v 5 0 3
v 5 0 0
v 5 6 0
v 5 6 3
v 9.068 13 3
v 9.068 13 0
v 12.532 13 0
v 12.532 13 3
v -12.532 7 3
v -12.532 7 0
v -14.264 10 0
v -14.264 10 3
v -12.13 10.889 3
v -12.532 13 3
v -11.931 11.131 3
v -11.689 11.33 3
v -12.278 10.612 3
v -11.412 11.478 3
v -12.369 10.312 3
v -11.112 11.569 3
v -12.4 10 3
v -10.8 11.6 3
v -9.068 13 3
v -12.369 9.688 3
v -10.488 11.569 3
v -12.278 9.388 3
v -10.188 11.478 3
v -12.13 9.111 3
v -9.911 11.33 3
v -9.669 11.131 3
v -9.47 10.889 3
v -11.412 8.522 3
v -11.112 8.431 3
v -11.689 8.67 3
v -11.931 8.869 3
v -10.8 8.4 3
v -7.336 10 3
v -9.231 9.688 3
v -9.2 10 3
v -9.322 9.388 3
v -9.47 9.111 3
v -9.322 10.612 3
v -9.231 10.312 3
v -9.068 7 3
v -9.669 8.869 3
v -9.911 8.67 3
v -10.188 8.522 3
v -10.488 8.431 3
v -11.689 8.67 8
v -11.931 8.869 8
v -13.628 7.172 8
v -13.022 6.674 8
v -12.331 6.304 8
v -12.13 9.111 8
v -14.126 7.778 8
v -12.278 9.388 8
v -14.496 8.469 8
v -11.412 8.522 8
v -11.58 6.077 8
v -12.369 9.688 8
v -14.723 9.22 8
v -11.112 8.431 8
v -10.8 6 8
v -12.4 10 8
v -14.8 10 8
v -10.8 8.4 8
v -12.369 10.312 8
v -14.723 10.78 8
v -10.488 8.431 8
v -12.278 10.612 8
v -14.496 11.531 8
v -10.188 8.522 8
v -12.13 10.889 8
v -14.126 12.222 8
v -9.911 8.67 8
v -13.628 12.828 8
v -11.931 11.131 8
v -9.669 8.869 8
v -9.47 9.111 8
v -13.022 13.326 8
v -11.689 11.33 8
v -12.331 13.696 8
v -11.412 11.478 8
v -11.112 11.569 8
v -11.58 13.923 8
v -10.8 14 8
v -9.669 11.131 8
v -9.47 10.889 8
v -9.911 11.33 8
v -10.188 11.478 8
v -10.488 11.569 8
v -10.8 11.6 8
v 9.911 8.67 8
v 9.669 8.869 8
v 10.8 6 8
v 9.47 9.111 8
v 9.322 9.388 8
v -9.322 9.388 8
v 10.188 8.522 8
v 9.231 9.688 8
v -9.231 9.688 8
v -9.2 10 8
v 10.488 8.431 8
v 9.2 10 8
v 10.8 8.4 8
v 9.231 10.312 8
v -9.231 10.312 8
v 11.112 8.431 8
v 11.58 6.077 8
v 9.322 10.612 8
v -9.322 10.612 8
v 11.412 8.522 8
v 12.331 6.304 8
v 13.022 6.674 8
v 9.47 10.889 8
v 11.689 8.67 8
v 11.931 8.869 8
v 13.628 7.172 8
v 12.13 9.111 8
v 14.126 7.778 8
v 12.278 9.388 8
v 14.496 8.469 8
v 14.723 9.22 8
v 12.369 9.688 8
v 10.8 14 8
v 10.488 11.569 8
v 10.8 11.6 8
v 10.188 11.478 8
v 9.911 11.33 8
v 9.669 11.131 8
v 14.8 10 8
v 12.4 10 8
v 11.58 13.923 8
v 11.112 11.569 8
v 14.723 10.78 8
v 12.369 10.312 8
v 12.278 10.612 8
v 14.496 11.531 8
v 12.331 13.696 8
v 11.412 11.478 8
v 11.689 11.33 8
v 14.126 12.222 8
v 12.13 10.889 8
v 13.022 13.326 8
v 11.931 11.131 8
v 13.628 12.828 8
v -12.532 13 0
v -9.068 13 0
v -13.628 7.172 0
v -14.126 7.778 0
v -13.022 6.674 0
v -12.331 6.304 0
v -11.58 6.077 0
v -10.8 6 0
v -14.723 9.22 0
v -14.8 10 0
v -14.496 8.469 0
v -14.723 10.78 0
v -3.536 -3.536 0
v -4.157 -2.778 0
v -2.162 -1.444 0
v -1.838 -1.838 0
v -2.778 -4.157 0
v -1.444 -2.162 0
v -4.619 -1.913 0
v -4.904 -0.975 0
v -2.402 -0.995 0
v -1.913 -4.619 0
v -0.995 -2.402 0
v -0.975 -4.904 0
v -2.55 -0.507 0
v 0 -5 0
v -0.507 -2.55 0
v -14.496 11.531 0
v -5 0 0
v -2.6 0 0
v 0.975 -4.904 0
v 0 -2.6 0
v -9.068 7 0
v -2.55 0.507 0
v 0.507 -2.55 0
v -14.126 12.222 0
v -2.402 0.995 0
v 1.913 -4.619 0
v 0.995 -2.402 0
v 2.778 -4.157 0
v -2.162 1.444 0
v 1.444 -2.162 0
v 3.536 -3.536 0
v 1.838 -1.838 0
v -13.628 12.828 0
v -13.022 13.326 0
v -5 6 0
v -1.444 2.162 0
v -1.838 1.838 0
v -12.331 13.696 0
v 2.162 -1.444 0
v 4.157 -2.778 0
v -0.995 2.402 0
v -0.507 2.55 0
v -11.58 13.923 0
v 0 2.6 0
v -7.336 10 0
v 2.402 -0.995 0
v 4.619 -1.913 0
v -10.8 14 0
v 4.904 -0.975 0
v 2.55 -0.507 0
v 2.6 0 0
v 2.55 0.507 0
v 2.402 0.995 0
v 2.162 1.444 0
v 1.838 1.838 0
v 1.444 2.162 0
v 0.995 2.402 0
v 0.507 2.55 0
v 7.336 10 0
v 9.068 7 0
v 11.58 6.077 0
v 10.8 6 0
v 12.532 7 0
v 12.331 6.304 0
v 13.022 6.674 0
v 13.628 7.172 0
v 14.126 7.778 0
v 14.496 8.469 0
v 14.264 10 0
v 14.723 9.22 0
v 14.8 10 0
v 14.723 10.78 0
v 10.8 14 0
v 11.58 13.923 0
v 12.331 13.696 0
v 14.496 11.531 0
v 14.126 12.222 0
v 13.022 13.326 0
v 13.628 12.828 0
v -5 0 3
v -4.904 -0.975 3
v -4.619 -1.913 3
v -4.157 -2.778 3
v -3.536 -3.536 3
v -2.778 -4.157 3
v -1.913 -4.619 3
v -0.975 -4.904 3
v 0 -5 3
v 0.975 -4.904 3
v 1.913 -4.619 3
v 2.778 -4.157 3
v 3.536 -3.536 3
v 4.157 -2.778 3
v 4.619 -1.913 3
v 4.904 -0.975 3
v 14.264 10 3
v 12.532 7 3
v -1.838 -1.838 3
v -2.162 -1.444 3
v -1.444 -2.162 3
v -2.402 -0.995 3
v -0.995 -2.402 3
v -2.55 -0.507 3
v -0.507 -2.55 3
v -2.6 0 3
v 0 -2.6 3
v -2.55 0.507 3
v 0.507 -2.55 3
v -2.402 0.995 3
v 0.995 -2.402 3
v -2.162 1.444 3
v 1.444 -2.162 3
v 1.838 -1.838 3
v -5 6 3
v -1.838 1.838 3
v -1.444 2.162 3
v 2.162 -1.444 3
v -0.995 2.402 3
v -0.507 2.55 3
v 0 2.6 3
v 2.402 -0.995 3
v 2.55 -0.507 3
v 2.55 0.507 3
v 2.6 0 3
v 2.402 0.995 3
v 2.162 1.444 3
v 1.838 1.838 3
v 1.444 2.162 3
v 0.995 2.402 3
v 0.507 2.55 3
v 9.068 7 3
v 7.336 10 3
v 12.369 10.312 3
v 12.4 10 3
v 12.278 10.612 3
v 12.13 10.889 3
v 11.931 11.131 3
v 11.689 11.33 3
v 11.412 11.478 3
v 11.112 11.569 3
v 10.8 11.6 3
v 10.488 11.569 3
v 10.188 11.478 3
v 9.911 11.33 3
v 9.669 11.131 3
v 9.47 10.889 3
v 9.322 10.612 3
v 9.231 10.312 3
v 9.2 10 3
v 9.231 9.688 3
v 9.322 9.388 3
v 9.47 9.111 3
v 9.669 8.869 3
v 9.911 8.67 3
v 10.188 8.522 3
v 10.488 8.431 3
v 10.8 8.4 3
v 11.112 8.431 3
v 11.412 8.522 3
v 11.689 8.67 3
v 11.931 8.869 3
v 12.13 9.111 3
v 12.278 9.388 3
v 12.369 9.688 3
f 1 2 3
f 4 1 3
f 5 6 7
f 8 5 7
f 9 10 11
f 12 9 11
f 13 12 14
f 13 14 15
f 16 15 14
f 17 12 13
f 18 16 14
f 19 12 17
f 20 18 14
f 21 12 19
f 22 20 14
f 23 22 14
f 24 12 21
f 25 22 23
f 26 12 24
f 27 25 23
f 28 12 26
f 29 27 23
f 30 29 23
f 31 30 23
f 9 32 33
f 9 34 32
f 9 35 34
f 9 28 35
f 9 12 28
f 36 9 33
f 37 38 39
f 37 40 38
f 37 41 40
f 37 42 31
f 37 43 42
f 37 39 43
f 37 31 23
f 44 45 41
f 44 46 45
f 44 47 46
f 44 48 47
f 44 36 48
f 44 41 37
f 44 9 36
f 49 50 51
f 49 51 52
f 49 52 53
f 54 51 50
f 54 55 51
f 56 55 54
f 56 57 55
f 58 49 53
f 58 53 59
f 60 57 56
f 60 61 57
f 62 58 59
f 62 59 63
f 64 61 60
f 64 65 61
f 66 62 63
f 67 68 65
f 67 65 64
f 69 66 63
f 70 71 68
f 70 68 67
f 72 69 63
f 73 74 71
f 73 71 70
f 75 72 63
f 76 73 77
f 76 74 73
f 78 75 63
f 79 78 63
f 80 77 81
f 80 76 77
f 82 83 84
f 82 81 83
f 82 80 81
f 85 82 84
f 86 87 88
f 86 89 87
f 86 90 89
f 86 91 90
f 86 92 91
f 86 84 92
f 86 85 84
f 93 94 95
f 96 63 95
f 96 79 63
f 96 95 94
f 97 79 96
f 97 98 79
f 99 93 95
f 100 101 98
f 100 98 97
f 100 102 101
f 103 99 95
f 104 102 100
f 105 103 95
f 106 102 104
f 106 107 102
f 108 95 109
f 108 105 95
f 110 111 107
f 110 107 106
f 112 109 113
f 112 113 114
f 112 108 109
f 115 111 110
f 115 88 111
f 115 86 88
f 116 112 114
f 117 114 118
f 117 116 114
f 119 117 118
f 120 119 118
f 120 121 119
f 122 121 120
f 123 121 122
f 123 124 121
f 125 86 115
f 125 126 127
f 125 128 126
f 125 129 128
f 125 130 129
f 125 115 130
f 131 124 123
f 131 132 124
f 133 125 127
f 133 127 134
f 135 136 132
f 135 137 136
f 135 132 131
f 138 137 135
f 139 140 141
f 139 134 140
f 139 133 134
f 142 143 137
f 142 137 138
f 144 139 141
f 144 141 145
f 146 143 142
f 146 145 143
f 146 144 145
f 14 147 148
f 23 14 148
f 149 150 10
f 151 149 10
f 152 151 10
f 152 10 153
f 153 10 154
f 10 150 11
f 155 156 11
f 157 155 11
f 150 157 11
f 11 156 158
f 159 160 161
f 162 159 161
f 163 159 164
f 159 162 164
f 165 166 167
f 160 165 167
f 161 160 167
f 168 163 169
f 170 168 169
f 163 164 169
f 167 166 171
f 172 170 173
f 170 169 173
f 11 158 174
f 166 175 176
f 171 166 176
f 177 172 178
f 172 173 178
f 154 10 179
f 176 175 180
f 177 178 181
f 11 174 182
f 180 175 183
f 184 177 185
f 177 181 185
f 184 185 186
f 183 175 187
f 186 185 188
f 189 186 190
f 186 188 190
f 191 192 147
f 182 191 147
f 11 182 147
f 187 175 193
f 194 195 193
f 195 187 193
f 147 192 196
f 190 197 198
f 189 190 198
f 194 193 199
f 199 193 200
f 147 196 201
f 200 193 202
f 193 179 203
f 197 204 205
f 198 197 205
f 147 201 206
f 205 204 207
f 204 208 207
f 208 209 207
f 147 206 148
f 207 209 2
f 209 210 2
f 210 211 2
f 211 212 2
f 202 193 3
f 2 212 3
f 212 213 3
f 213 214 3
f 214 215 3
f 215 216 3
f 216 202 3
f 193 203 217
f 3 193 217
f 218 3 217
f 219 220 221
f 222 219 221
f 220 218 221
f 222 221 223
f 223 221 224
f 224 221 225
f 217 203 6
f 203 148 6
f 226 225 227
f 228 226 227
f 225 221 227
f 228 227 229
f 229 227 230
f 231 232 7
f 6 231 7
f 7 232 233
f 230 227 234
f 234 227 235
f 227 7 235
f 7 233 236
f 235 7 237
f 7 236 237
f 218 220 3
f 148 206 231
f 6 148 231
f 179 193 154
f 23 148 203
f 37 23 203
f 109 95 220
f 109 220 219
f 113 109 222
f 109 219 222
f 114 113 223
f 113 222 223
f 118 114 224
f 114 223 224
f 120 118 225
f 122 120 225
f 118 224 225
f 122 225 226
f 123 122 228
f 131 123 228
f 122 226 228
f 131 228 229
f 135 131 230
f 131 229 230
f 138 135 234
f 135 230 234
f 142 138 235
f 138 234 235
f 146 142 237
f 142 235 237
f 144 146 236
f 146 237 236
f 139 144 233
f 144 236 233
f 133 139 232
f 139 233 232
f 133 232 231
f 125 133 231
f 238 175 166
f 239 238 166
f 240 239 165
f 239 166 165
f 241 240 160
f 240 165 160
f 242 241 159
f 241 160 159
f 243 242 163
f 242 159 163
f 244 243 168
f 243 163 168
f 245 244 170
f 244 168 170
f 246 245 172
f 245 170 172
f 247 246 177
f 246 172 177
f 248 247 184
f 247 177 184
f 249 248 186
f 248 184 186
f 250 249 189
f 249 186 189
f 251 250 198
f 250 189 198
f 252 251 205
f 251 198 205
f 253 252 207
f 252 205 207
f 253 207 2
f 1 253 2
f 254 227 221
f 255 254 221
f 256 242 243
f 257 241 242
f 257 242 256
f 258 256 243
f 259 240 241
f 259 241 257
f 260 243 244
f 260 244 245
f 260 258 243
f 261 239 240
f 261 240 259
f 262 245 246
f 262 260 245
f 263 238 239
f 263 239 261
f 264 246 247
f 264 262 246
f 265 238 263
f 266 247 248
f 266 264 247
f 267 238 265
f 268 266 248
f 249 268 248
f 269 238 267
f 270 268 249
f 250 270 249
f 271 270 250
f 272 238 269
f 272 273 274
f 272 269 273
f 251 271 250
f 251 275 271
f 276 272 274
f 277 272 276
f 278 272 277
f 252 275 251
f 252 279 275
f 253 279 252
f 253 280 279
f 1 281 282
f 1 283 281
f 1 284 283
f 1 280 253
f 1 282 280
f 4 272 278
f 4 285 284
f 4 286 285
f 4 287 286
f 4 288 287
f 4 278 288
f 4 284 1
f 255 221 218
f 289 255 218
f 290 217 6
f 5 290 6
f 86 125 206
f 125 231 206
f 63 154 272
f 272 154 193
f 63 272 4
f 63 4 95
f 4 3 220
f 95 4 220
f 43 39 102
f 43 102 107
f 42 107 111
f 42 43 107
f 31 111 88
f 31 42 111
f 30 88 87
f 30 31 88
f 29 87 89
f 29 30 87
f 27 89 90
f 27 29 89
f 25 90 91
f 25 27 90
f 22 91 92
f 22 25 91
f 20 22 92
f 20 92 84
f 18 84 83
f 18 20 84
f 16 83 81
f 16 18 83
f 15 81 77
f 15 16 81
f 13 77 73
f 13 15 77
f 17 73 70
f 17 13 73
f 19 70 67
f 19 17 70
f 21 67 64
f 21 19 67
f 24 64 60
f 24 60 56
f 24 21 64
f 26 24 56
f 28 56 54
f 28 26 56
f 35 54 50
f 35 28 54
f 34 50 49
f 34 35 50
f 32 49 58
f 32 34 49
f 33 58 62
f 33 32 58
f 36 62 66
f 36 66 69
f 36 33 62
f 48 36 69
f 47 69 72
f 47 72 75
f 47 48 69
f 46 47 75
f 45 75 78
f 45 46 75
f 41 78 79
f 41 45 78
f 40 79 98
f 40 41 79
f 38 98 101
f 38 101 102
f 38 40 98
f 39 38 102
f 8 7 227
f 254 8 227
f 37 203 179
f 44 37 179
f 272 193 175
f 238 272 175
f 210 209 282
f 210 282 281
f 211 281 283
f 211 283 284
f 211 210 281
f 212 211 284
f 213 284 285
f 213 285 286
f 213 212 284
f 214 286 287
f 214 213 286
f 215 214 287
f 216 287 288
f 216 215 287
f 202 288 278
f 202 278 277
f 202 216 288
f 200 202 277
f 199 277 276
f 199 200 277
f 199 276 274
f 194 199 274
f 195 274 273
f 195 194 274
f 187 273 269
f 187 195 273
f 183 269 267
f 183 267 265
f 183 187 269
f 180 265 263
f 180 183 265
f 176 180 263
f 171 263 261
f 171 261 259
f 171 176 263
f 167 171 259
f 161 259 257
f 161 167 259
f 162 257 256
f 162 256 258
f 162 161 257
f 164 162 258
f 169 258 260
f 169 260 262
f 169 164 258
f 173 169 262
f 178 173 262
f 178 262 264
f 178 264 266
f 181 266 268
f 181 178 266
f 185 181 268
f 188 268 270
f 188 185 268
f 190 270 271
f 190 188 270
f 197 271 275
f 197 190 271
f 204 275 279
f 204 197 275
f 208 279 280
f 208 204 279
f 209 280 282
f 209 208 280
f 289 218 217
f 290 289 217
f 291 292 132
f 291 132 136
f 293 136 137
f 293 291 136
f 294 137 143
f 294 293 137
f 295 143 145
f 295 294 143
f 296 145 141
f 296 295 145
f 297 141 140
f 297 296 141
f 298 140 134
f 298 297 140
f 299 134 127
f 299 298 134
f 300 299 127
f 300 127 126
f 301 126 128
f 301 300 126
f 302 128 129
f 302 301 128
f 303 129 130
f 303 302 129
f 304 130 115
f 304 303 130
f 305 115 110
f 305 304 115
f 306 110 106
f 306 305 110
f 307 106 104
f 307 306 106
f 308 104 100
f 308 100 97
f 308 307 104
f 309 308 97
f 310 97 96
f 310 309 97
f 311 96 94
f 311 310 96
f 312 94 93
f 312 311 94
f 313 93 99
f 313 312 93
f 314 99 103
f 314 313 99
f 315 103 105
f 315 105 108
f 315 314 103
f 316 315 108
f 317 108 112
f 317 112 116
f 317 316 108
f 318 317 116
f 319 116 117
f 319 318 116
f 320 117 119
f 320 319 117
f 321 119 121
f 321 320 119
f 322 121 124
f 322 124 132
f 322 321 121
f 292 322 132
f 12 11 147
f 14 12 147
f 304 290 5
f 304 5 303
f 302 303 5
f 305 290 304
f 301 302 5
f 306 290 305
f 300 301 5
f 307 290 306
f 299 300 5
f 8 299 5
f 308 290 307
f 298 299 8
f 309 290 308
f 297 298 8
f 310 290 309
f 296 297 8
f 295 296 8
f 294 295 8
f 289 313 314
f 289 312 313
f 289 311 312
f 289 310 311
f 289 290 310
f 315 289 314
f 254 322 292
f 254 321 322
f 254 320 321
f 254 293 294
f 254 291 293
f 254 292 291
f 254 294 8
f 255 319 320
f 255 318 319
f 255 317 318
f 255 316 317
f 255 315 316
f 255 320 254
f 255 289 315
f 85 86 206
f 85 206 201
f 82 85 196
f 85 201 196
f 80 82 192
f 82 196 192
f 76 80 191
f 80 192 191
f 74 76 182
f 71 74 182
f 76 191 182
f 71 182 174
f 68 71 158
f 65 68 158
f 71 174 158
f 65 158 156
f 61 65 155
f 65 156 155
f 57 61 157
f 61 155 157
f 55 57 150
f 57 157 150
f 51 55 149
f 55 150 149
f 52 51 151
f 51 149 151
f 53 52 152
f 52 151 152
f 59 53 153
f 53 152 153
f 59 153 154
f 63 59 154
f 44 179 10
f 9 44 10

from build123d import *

# Parameters (mm, degrees)
F0_R     = 2.6
F0_R_2   = 1.6
F1_DEPTH = 3
F2_R     = 1.6
F3_DEPTH = 5
F5_DEPTH = 3


with BuildPart() as f1:
    # F0 (on Top) → F1 (new body)
    with BuildSketch(Plane.XY):
        with BuildLine():
            Line((-5, 6), (-5, 0))
            ThreePointArc((-5, 0), (0, -5), (5, 0))
            Line((5, 0), (5, 6))
            Line((5, 6), (10.8, 6))
            ThreePointArc((10.8, 6), (14.8, 10), (10.8, 14))
            Line((10.8, 14), (0, 14))
            Line((0, 14), (-10.8, 14))
            ThreePointArc((-10.8, 14), (-14.8, 10), (-10.8, 6))
            Line((-10.8, 6), (-5, 6))
        make_face()
        Circle(F0_R, mode=Mode.SUBTRACT)
        with Locations((-10.8, 10)):
            Circle(F0_R_2, mode=Mode.SUBTRACT)
        with Locations((10.8, 10)):
            Circle(F0_R_2, mode=Mode.SUBTRACT)
    extrude(amount=F1_DEPTH)

    # F2 (on face) → F3 (join)
    with BuildSketch(Plane.XY.offset(3)):
        with BuildLine():
            ThreePointArc((10.8, 6), (14.8, 10), (10.8, 14))
            Line((10.8, 14), (-10.8, 14))
            ThreePointArc((-10.8, 14), (-14.8, 10), (-10.8, 6))
            Line((-10.8, 6), (-5, 6))
            Line((-5, 6), (5, 6))
            Line((5, 6), (10.8, 6))
        make_face()
        with Locations((-10.8, 10)):
            Circle(F2_R, mode=Mode.SUBTRACT)
        with Locations((10.8, 10)):
            Circle(F2_R, mode=Mode.SUBTRACT)
    extrude(amount=F3_DEPTH)

    # F4 (on face) → F5 (cut)
    with BuildSketch(Plane(origin=(0, 0, 0), x_dir=(1, 0, 0), z_dir=(0, 0, -1))):
        Polygon((9.067949, -13), (12.532051, -13), (14.264102, -10), (12.532051, -7), (9.067949, -7), (7.335898, -10), align=None)
        Polygon((-12.532051, -13), (-9.067949, -13), (-7.335898, -10), (-9.067949, -7), (-12.532051, -7), (-14.264102, -10), align=None)
    extrude(amount=-F5_DEPTH, mode=Mode.SUBTRACT)


solid = f1.part
